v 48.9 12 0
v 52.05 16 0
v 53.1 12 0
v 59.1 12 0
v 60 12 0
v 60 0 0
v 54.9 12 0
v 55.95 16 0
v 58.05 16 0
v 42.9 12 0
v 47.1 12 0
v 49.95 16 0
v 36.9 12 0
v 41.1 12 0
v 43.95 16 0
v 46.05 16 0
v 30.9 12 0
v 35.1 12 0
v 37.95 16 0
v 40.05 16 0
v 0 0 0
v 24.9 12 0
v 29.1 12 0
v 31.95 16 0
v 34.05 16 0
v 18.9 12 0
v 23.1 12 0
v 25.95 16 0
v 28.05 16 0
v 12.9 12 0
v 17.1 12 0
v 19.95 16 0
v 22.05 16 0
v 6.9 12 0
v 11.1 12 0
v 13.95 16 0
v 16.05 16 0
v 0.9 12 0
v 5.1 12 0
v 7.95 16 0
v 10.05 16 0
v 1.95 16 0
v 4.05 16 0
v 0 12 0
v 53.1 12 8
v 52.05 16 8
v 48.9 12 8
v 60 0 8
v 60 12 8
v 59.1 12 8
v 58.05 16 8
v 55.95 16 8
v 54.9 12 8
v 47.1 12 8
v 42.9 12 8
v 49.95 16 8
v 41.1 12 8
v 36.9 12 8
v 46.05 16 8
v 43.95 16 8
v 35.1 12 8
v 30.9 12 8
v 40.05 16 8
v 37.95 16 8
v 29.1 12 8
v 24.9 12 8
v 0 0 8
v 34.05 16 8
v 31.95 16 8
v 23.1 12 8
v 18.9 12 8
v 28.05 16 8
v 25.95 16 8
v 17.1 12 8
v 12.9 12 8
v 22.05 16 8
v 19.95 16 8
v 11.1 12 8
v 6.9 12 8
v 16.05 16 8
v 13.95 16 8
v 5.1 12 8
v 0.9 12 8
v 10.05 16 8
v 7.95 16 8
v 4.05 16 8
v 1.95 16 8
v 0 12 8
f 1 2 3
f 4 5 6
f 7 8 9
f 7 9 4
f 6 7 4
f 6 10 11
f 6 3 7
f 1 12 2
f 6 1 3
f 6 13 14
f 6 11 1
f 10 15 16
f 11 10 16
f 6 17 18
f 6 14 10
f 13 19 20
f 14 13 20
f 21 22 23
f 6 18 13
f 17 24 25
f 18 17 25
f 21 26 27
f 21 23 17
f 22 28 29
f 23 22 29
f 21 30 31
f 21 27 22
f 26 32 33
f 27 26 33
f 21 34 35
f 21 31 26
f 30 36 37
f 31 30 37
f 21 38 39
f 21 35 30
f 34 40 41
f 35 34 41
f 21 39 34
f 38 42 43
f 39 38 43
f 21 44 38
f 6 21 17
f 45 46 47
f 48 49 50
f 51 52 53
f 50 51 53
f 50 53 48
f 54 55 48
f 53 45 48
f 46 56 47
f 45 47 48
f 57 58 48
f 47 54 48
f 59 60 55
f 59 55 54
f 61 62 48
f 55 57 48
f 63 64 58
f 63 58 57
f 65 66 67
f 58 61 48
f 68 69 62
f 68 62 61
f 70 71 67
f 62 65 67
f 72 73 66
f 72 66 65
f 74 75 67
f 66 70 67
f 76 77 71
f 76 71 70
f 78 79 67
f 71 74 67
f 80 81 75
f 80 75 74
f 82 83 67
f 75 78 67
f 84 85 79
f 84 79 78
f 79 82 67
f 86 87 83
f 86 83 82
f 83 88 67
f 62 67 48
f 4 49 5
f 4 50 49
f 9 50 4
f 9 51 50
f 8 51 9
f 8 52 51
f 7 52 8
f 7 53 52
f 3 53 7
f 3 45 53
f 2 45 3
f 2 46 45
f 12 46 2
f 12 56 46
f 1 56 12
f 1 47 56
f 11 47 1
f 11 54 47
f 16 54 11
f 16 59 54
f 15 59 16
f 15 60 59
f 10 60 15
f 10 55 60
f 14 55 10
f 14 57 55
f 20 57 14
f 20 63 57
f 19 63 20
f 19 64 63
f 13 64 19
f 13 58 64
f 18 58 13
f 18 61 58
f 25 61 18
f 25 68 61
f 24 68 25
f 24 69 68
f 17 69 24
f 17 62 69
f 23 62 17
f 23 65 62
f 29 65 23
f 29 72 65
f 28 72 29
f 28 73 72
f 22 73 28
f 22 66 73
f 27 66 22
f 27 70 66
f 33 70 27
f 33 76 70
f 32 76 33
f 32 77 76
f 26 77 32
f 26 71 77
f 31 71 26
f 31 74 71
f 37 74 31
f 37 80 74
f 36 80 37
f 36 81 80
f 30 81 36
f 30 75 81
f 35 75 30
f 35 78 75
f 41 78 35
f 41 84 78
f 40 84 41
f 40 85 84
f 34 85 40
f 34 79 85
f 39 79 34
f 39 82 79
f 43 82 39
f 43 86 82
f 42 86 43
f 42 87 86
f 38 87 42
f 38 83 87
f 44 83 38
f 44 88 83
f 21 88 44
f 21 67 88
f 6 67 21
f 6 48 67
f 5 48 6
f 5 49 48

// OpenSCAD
$fn = 32;

// ----------------------------------------------------------------------
// Gear rack: 10 teeth, pitch 6 mm
// ----------------------------------------------------------------------

// --- parameters (mm) ---
teeth = 10;               // number of teeth
pitch = 6;                // tooth pitch, X
root_w = 4.2;             // tooth width at the root
tip_w = 2.1;              // tooth width at the tip
base_h = 12;              // rack body height, Y
tooth_h = 4;              // tooth height above the body
plate_t = 8;              // rack width, Z (extrusion height)

rack_l = teeth * pitch;  // overall length
total_h = base_h + tooth_h;  // overall height

profile = [[0, 0], [60, 0], [60, 12], [59.1, 12], [58.05, 16], [55.95, 16], [54.9, 12], [53.1, 12], [52.05, 16], [49.95, 16], [48.9, 12], [47.1, 12], [46.05, 16], [43.95, 16], [42.9, 12], [41.1, 12], [40.05, 16], [37.95, 16], [36.9, 12], [35.1, 12], [34.05, 16], [31.95, 16], [30.9, 12], [29.1, 12], [28.05, 16], [25.95, 16], [24.9, 12], [23.1, 12], [22.05, 16], [19.95, 16], [18.9, 12], [17.1, 12], [16.05, 16], [13.95, 16], [12.9, 12], [11.1, 12], [10.05, 16], [7.95, 16], [6.9, 12], [5.1, 12], [4.05, 16], [1.95, 16], [0.9, 12], [0, 12]];  // primary outline, 44 points, counter clockwise

// --- the one profile operation ---
linear_extrude(height = plate_t) polygon(points = profile);
